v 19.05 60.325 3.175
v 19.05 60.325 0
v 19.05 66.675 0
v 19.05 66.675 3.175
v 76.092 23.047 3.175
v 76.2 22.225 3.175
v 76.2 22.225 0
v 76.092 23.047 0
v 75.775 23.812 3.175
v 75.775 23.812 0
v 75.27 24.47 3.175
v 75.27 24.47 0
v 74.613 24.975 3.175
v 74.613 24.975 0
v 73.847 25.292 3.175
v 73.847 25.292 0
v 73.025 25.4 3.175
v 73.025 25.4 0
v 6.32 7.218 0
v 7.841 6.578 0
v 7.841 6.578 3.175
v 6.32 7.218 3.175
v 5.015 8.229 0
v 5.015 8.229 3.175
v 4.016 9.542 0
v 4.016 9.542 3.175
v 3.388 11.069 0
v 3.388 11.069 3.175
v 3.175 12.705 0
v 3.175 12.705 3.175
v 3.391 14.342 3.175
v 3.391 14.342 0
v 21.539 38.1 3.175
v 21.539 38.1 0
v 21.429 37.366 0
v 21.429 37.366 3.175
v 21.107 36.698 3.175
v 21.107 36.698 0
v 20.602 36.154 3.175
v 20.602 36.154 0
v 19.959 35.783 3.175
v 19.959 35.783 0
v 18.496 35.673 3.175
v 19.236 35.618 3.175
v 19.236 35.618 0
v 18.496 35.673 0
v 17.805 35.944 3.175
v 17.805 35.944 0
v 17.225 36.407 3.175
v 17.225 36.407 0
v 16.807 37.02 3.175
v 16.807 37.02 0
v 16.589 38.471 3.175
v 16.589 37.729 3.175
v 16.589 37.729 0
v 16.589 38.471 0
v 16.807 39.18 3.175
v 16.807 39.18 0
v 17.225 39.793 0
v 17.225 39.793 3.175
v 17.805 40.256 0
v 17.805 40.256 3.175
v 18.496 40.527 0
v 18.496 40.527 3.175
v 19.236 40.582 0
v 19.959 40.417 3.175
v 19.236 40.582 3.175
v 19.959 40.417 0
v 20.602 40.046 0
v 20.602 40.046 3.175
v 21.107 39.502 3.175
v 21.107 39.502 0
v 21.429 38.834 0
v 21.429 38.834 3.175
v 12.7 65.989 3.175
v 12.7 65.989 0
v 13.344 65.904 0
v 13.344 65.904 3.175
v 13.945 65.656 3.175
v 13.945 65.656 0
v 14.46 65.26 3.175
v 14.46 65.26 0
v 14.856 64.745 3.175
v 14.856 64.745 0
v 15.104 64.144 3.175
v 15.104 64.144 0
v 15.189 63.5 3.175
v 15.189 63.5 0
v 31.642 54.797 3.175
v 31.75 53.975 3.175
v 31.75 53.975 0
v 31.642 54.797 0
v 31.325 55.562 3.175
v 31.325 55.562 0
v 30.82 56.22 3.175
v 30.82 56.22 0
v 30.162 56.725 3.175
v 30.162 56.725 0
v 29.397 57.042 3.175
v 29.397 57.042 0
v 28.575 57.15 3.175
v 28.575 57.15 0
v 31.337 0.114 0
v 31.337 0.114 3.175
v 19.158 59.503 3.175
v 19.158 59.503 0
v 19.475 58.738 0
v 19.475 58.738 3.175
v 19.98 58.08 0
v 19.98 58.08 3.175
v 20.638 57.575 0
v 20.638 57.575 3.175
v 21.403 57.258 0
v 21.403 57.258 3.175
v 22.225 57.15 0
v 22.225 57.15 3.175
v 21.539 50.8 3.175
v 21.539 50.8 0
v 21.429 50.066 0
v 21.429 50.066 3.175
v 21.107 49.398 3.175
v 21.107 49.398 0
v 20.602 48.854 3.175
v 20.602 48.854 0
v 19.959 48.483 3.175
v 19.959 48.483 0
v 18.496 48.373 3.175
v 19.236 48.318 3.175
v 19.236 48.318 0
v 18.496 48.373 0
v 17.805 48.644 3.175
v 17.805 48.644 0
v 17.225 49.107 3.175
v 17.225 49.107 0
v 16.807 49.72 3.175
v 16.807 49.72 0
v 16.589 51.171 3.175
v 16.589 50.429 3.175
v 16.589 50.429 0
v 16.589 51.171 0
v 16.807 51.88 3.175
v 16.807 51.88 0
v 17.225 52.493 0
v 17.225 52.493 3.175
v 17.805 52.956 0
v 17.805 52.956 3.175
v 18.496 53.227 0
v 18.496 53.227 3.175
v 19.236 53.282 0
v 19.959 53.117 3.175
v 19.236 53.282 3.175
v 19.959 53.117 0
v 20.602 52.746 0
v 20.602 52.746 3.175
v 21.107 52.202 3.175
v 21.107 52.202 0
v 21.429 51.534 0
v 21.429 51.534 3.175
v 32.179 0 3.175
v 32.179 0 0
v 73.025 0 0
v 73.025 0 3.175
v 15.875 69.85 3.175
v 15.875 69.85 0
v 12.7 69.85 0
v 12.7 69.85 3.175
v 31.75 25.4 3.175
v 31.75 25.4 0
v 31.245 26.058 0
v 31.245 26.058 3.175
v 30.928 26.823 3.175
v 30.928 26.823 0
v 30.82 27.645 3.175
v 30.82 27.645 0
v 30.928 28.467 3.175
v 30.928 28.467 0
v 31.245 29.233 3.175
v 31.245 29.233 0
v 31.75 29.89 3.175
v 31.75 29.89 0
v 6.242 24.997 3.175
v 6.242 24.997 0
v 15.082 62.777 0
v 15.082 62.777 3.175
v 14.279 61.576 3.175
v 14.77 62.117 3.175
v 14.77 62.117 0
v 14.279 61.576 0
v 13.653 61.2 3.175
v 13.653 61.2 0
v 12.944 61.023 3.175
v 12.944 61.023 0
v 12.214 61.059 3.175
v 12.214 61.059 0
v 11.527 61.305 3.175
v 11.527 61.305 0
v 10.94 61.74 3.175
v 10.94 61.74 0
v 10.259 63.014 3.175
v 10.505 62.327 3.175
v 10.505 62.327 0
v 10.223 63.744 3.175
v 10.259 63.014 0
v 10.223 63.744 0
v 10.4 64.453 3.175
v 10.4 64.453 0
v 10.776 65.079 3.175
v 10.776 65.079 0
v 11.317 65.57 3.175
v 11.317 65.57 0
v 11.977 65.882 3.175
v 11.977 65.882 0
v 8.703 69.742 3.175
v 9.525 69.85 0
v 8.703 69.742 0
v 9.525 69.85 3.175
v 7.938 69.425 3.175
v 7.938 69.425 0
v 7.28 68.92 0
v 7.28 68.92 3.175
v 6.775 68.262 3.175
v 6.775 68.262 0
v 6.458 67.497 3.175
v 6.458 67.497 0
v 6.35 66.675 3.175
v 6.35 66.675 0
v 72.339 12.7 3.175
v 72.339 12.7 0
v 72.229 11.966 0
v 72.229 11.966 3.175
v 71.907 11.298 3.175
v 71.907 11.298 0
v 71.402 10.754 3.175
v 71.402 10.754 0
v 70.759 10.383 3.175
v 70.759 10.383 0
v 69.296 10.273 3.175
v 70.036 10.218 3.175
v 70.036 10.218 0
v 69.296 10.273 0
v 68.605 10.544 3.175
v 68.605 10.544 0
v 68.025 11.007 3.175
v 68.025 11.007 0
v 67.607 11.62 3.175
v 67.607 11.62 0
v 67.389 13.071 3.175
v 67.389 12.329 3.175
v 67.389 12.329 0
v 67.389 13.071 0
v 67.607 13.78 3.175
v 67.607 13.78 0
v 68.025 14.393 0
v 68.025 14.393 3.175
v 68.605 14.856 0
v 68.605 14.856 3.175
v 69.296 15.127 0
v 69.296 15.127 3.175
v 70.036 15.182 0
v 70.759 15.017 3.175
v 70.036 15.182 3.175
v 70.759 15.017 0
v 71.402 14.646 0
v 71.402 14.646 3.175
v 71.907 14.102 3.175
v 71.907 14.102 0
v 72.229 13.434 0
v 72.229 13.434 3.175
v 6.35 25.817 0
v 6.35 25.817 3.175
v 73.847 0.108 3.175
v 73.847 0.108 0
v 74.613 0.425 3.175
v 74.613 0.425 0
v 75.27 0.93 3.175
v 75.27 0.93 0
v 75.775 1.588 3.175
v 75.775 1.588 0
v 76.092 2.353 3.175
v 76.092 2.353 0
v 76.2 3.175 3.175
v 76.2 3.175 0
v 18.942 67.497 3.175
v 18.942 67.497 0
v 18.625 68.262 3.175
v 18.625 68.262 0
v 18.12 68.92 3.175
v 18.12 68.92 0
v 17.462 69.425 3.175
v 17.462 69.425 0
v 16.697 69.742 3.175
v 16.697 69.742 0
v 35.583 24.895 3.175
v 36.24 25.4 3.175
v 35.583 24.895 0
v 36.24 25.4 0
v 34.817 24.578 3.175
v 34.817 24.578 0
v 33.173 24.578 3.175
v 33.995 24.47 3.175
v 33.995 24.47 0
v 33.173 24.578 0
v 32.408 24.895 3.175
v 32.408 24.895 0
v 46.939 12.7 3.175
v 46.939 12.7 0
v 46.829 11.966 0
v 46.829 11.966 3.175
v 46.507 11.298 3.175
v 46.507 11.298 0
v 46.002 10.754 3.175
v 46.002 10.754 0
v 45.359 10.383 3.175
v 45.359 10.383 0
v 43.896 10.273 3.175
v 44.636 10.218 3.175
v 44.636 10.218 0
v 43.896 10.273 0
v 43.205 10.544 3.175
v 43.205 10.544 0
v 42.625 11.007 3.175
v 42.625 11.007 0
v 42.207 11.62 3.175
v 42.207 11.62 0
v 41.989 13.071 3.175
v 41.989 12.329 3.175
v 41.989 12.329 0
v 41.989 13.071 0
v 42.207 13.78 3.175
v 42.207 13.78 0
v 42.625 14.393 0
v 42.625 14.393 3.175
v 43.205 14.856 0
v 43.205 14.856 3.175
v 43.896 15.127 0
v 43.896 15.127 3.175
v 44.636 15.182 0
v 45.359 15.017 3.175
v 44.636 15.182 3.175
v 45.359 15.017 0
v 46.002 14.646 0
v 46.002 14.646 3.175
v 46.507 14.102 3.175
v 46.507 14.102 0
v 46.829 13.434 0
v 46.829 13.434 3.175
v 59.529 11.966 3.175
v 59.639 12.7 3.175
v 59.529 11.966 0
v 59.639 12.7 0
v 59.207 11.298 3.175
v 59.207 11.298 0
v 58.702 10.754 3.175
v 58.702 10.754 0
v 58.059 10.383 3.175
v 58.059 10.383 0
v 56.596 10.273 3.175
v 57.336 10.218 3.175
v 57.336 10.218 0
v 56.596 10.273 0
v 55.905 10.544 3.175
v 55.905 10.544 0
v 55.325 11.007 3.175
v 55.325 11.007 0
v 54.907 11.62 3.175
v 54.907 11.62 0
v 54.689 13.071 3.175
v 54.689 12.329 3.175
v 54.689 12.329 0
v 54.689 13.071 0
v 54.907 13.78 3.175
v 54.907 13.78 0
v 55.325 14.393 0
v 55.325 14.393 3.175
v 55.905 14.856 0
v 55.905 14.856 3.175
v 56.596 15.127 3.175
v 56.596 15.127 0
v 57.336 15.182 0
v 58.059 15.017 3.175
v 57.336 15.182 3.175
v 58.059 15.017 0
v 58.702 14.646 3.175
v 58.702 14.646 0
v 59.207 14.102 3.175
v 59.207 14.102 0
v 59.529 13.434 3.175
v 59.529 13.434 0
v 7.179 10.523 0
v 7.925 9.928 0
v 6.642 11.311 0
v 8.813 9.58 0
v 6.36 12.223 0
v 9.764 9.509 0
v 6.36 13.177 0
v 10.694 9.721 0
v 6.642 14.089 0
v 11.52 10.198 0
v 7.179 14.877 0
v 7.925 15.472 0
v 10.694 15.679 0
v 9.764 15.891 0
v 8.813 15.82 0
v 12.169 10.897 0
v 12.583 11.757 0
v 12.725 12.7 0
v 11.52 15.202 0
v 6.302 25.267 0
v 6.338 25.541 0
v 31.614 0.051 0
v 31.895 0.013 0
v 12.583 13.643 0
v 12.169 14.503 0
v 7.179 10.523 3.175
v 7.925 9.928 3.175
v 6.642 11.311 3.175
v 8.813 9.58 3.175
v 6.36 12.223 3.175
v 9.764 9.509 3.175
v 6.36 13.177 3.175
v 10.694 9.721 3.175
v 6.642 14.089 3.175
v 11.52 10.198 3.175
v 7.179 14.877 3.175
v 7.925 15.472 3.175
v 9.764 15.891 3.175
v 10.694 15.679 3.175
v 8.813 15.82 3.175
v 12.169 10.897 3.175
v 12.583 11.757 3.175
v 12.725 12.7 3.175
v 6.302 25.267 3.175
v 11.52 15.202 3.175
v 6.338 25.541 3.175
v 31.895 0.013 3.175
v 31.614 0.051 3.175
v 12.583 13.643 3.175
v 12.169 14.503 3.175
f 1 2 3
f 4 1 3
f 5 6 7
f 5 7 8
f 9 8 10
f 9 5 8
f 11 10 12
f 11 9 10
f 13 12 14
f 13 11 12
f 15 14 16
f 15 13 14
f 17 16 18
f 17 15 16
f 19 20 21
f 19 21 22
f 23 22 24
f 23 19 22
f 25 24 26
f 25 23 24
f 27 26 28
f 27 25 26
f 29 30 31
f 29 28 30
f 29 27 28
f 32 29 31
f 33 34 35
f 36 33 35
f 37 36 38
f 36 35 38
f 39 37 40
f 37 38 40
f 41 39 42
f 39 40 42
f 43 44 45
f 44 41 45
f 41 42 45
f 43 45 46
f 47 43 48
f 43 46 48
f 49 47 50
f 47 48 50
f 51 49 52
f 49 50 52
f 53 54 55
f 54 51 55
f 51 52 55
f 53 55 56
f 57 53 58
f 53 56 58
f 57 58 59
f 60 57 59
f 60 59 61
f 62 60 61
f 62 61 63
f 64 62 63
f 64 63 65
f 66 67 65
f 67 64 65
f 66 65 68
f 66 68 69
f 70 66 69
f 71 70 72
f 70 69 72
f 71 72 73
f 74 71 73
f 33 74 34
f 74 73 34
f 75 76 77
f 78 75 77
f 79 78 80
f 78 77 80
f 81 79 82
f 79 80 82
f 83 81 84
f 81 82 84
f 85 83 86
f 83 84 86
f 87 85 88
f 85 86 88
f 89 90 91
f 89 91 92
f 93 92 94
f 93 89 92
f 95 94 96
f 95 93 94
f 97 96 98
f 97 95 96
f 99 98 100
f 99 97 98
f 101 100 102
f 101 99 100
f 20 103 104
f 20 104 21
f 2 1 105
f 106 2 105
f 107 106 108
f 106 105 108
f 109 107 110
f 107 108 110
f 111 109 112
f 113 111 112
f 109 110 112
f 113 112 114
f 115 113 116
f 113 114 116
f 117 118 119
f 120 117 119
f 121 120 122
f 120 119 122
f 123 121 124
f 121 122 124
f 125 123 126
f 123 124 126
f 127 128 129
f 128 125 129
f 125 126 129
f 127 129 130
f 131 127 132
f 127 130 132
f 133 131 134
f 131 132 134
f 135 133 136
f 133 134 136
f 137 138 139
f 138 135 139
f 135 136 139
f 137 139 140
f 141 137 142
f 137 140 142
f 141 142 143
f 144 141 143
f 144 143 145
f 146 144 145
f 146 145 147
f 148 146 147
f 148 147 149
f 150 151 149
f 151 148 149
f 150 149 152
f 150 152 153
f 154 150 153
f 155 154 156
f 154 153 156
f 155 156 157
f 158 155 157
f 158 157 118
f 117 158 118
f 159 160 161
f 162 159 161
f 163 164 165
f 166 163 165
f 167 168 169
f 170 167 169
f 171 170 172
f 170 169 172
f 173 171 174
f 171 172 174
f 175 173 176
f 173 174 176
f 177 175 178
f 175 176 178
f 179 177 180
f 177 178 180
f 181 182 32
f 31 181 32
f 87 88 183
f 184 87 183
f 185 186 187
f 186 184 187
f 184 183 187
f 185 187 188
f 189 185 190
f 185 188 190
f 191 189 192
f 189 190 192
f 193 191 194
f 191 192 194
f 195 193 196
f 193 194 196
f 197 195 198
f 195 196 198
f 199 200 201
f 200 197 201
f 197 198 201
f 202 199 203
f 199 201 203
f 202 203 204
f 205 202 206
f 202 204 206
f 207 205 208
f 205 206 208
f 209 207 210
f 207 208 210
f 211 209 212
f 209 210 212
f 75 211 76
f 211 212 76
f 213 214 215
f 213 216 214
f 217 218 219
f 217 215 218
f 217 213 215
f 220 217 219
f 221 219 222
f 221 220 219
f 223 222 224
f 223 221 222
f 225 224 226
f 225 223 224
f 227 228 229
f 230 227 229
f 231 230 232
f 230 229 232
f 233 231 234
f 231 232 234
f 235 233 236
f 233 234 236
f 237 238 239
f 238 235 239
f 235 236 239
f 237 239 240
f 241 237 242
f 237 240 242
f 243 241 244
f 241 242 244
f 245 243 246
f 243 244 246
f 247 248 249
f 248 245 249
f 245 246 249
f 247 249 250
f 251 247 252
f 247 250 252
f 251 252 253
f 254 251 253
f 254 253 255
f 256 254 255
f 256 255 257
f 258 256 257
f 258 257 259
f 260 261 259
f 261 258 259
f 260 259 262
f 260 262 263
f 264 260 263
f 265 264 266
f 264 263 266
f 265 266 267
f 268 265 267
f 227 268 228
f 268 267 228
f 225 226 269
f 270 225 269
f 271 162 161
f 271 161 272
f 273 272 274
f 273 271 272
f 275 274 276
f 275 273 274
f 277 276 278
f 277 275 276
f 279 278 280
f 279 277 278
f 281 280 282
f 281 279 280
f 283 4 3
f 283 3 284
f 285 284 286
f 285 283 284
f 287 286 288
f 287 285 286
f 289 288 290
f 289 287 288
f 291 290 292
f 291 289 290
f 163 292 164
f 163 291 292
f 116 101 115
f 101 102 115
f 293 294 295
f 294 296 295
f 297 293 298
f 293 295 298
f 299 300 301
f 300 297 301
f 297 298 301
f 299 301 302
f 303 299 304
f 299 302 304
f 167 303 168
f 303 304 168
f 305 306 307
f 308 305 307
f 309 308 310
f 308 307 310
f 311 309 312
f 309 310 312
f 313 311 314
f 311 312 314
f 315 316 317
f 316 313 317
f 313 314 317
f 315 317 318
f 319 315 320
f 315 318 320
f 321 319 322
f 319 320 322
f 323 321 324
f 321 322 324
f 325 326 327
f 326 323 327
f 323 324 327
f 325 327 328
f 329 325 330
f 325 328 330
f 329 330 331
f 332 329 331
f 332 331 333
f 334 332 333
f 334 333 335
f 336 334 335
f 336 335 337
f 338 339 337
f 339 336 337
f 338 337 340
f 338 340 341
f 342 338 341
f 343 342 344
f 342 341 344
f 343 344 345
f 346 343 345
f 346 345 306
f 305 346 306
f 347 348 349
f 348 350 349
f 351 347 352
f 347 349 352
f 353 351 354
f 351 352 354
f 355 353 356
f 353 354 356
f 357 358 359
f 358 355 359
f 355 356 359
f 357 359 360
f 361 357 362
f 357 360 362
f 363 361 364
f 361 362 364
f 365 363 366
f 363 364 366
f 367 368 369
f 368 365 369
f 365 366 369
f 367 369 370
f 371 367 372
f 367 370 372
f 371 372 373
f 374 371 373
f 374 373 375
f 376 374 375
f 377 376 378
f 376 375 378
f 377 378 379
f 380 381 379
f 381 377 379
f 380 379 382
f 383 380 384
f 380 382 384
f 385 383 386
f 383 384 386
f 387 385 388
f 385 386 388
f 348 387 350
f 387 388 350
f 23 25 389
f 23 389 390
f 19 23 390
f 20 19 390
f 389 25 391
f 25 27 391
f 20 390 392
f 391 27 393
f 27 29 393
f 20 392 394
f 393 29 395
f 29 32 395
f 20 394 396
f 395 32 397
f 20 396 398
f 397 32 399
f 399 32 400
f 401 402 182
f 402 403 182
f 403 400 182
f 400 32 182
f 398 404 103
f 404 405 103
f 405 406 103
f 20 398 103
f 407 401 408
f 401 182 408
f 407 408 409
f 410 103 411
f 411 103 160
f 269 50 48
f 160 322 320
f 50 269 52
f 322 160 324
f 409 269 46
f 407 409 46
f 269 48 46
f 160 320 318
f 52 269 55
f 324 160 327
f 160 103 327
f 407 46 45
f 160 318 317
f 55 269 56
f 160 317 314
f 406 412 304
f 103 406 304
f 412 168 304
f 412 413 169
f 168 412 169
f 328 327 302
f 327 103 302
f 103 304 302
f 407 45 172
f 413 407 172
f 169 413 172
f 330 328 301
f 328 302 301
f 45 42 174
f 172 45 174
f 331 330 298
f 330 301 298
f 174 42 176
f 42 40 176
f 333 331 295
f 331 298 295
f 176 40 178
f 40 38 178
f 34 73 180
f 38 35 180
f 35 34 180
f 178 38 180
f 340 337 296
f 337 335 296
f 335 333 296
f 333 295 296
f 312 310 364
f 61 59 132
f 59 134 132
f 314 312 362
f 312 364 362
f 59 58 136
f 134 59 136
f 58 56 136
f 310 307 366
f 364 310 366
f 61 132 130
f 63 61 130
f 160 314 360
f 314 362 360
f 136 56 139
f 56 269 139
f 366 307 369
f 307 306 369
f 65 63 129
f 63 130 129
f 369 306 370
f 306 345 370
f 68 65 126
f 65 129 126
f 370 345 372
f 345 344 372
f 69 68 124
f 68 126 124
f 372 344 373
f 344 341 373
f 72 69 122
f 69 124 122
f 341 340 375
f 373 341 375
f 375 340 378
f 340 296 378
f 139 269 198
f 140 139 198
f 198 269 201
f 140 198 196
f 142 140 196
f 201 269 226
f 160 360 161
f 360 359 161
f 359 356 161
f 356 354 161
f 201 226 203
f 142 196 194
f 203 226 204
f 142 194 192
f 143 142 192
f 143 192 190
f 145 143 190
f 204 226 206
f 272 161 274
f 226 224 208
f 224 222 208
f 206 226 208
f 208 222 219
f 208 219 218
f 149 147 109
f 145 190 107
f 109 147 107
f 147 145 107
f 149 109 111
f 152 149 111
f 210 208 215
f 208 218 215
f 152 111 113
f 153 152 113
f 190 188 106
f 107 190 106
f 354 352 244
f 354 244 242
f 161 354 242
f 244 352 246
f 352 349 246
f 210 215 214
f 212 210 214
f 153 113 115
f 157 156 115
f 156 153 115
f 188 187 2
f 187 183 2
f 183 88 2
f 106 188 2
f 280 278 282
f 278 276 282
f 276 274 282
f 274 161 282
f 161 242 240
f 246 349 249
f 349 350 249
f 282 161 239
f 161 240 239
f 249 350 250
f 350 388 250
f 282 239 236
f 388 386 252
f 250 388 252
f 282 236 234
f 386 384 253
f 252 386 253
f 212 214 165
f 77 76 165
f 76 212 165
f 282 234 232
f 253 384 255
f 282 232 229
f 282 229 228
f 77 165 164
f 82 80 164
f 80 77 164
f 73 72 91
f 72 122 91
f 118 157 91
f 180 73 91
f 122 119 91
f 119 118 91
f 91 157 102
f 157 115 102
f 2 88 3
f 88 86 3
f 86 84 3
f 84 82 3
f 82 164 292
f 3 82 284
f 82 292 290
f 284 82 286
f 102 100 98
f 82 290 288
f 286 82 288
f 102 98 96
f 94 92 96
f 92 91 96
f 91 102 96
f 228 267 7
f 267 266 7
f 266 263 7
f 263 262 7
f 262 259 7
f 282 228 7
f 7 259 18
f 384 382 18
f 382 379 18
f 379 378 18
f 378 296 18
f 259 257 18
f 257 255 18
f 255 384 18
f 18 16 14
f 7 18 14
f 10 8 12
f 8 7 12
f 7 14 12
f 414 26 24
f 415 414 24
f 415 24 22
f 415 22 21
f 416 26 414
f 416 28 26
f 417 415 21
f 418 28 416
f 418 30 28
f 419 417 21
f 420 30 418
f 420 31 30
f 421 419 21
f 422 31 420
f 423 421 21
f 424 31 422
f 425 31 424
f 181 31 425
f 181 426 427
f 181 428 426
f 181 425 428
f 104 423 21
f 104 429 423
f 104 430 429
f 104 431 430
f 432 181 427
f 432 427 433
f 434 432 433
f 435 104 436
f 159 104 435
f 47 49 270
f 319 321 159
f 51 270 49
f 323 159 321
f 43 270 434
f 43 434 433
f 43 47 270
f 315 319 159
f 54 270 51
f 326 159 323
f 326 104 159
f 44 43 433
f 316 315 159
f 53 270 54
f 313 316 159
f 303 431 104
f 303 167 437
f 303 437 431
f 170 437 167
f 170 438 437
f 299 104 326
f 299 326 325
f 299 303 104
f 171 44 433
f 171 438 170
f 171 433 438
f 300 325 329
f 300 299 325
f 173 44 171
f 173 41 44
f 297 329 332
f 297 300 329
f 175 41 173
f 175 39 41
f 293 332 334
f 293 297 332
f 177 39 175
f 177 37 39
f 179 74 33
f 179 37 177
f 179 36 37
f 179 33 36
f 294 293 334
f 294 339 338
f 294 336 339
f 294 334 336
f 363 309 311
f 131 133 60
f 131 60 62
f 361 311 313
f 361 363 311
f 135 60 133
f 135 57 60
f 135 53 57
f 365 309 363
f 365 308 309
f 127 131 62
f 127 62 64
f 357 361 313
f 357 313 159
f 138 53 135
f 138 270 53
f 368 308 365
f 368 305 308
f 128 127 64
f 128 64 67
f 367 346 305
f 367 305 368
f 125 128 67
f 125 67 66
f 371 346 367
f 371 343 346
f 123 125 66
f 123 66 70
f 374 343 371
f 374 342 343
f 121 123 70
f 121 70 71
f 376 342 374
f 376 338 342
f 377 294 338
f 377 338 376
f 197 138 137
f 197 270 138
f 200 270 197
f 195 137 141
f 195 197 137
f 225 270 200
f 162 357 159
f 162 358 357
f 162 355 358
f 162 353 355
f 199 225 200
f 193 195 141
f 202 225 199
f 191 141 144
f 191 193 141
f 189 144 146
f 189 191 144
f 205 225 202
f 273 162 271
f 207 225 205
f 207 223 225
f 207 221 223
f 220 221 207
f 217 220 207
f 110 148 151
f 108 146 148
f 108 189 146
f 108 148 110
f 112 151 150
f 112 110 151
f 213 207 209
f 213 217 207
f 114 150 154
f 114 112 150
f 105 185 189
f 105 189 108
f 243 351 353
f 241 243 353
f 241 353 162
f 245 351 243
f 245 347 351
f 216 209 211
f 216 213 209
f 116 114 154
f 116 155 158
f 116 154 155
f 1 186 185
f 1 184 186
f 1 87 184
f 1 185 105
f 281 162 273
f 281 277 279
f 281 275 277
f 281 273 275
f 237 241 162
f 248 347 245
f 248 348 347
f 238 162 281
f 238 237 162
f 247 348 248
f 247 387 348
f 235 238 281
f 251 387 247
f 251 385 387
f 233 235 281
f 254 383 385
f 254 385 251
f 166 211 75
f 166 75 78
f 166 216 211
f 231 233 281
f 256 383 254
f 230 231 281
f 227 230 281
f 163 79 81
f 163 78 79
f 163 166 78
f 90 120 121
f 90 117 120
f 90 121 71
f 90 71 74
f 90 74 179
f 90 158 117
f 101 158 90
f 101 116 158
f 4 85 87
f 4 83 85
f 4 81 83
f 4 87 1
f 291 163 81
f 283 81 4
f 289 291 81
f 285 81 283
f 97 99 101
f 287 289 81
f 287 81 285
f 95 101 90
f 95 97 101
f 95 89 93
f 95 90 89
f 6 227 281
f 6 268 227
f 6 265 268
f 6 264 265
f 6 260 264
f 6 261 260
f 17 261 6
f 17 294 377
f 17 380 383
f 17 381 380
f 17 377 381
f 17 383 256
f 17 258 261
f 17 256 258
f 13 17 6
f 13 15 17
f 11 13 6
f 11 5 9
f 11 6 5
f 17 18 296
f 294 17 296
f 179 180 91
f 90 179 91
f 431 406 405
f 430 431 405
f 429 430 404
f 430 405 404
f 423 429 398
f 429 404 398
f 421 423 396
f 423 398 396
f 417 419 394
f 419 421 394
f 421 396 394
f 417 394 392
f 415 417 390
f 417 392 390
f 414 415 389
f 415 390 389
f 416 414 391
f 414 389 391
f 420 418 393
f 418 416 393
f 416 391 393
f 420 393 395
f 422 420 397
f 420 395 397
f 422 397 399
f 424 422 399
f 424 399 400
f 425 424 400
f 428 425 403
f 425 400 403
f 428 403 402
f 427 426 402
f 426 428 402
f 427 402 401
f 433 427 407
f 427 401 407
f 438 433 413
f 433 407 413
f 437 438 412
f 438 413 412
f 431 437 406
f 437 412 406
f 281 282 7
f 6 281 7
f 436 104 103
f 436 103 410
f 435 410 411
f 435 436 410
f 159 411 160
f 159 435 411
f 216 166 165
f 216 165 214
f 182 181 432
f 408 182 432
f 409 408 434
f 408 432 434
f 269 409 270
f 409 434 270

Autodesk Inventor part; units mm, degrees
ref_plane "YZ Plane" through (0, 0, 0) normal (1, 0, 0) x (0, 1, 0)
ref_plane "XZ Plane" through (0, 0, 0) normal (0, 1, 0) x (-1, 0, 0)
ref_plane "XY Plane" through (0, 0, 0) normal (0, 0, 1) x (1, 0, 0)
sketch "Sketch1" plane through (0, 0, 0) normal (0, 0, 1) x (1, 0, 0)
  line L0 (0, 0) -> (0, 13.4062)
  line L1 (0, 0) -> (20.3742, 0)
  circle A0 centre (9.525, 12.7) radius 9.525 construction
  circle A1 centre (9.525, 12.7) radius 3.2004
  line L2 (31.75, 0) -> (7.8407, 6.5775)
  arc A2 (3.3908, 14.3415) -> (7.8407, 6.5775) centre (9.525, 12.7) ccw
  line L3 (31.75, 0) -> (76.2, 0)
  line L4 (76.2, 0) -> (76.2, 25.4)
  line L5 (76.2, 25.4) -> (31.75, 25.4)
  line L6 (31.75, 25.4) -> (31.75, 57.15)
  line L7 (31.75, 57.15) -> (19.05, 57.15)
  line L8 (19.05, 57.15) -> (19.05, 69.85)
  line L9 (19.05, 69.85) -> (6.35, 69.85)
  line L10 (6.35, 69.85) -> (6.35, 25.4)
  line L11 (6.35, 25.4) -> (3.3908, 14.3415)
  circle A3 centre (12.7, 63.5) radius 2.4892
  line L12 (12.7, 69.85) -> (12.7, 63.5)
  circle A4 centre (44.45, 12.7) radius 2.4892
  circle A5 centre (57.15, 12.7) radius 2.4892
  circle A6 centre (69.85, 12.7) radius 2.4892
  circle A7 centre (19.05, 38.1) radius 2.4892
  circle A8 centre (19.05, 50.8) radius 2.4892
  line L13 (19.05, 50.8) -> (19.05, 38.1) construction
  arc A9 (31.75, 29.8901) -> (36.2401, 25.4) centre (33.9951, 27.6451) ccw
  circle A10 centre (31.2867, 27.5124) radius 0.4633 construction
  circle A11 centre (33.8624, 24.9367) radius 0.4633 construction
  line L14 (31.75, 25.4) -> (31.2867, 27.5124) construction
  line L15 (31.75, 25.4) -> (33.8624, 24.9367) construction
  point P0 (76.2, 12.7)
  dimension "d0" = 19.05
  dimension "d1" = 3.175
  dimension "d2" = 6.4008
  dimension "d6" = 12.7
  dimension "d7" = 25.4
  dimension "d8" = 4.9784
  dimension "d16" = 6.35
  dimension "d17" = 25.4
  dimension "d19" = 6.35
  dimension "d24" = 12.7
  dimension "d29" = 6.35
  dimension "d30" = 12.7
  dimension "d35" = 12.7
  dimension "d36" = 12.7
  dimension "d37" = 12.7
  dimension "d38" = 6.35
  dimension "d39" = 12.7
  dimension "d40" = 6.35
extrude "Extrusion1" add sketch "Sketch1" along normal blind 3.175 contours L2 A2 L11 L10 L9 L8 L7 L6 A9 L5 L4 L3
fillet "Fillet1" radius 3.175 8 edges at (6.35, 69.85, 1.5875) (19.05, 69.85, 1.5875) (76.2, 25.4, 1.5875) (76.2, 0, 1.5875) (6.35, 25.4, 1.5875) (31.75, 0, 1.5875) (31.75, 57.15, 1.5875) (19.05, 57.15, 1.5875)
equation "\"d24\" = d11"
equation "\"d11\" = 12.7"
properties part number "Bottom Bearing Plate (R4 - 0.25in Between Stages)" material "Aluminum 6061"
